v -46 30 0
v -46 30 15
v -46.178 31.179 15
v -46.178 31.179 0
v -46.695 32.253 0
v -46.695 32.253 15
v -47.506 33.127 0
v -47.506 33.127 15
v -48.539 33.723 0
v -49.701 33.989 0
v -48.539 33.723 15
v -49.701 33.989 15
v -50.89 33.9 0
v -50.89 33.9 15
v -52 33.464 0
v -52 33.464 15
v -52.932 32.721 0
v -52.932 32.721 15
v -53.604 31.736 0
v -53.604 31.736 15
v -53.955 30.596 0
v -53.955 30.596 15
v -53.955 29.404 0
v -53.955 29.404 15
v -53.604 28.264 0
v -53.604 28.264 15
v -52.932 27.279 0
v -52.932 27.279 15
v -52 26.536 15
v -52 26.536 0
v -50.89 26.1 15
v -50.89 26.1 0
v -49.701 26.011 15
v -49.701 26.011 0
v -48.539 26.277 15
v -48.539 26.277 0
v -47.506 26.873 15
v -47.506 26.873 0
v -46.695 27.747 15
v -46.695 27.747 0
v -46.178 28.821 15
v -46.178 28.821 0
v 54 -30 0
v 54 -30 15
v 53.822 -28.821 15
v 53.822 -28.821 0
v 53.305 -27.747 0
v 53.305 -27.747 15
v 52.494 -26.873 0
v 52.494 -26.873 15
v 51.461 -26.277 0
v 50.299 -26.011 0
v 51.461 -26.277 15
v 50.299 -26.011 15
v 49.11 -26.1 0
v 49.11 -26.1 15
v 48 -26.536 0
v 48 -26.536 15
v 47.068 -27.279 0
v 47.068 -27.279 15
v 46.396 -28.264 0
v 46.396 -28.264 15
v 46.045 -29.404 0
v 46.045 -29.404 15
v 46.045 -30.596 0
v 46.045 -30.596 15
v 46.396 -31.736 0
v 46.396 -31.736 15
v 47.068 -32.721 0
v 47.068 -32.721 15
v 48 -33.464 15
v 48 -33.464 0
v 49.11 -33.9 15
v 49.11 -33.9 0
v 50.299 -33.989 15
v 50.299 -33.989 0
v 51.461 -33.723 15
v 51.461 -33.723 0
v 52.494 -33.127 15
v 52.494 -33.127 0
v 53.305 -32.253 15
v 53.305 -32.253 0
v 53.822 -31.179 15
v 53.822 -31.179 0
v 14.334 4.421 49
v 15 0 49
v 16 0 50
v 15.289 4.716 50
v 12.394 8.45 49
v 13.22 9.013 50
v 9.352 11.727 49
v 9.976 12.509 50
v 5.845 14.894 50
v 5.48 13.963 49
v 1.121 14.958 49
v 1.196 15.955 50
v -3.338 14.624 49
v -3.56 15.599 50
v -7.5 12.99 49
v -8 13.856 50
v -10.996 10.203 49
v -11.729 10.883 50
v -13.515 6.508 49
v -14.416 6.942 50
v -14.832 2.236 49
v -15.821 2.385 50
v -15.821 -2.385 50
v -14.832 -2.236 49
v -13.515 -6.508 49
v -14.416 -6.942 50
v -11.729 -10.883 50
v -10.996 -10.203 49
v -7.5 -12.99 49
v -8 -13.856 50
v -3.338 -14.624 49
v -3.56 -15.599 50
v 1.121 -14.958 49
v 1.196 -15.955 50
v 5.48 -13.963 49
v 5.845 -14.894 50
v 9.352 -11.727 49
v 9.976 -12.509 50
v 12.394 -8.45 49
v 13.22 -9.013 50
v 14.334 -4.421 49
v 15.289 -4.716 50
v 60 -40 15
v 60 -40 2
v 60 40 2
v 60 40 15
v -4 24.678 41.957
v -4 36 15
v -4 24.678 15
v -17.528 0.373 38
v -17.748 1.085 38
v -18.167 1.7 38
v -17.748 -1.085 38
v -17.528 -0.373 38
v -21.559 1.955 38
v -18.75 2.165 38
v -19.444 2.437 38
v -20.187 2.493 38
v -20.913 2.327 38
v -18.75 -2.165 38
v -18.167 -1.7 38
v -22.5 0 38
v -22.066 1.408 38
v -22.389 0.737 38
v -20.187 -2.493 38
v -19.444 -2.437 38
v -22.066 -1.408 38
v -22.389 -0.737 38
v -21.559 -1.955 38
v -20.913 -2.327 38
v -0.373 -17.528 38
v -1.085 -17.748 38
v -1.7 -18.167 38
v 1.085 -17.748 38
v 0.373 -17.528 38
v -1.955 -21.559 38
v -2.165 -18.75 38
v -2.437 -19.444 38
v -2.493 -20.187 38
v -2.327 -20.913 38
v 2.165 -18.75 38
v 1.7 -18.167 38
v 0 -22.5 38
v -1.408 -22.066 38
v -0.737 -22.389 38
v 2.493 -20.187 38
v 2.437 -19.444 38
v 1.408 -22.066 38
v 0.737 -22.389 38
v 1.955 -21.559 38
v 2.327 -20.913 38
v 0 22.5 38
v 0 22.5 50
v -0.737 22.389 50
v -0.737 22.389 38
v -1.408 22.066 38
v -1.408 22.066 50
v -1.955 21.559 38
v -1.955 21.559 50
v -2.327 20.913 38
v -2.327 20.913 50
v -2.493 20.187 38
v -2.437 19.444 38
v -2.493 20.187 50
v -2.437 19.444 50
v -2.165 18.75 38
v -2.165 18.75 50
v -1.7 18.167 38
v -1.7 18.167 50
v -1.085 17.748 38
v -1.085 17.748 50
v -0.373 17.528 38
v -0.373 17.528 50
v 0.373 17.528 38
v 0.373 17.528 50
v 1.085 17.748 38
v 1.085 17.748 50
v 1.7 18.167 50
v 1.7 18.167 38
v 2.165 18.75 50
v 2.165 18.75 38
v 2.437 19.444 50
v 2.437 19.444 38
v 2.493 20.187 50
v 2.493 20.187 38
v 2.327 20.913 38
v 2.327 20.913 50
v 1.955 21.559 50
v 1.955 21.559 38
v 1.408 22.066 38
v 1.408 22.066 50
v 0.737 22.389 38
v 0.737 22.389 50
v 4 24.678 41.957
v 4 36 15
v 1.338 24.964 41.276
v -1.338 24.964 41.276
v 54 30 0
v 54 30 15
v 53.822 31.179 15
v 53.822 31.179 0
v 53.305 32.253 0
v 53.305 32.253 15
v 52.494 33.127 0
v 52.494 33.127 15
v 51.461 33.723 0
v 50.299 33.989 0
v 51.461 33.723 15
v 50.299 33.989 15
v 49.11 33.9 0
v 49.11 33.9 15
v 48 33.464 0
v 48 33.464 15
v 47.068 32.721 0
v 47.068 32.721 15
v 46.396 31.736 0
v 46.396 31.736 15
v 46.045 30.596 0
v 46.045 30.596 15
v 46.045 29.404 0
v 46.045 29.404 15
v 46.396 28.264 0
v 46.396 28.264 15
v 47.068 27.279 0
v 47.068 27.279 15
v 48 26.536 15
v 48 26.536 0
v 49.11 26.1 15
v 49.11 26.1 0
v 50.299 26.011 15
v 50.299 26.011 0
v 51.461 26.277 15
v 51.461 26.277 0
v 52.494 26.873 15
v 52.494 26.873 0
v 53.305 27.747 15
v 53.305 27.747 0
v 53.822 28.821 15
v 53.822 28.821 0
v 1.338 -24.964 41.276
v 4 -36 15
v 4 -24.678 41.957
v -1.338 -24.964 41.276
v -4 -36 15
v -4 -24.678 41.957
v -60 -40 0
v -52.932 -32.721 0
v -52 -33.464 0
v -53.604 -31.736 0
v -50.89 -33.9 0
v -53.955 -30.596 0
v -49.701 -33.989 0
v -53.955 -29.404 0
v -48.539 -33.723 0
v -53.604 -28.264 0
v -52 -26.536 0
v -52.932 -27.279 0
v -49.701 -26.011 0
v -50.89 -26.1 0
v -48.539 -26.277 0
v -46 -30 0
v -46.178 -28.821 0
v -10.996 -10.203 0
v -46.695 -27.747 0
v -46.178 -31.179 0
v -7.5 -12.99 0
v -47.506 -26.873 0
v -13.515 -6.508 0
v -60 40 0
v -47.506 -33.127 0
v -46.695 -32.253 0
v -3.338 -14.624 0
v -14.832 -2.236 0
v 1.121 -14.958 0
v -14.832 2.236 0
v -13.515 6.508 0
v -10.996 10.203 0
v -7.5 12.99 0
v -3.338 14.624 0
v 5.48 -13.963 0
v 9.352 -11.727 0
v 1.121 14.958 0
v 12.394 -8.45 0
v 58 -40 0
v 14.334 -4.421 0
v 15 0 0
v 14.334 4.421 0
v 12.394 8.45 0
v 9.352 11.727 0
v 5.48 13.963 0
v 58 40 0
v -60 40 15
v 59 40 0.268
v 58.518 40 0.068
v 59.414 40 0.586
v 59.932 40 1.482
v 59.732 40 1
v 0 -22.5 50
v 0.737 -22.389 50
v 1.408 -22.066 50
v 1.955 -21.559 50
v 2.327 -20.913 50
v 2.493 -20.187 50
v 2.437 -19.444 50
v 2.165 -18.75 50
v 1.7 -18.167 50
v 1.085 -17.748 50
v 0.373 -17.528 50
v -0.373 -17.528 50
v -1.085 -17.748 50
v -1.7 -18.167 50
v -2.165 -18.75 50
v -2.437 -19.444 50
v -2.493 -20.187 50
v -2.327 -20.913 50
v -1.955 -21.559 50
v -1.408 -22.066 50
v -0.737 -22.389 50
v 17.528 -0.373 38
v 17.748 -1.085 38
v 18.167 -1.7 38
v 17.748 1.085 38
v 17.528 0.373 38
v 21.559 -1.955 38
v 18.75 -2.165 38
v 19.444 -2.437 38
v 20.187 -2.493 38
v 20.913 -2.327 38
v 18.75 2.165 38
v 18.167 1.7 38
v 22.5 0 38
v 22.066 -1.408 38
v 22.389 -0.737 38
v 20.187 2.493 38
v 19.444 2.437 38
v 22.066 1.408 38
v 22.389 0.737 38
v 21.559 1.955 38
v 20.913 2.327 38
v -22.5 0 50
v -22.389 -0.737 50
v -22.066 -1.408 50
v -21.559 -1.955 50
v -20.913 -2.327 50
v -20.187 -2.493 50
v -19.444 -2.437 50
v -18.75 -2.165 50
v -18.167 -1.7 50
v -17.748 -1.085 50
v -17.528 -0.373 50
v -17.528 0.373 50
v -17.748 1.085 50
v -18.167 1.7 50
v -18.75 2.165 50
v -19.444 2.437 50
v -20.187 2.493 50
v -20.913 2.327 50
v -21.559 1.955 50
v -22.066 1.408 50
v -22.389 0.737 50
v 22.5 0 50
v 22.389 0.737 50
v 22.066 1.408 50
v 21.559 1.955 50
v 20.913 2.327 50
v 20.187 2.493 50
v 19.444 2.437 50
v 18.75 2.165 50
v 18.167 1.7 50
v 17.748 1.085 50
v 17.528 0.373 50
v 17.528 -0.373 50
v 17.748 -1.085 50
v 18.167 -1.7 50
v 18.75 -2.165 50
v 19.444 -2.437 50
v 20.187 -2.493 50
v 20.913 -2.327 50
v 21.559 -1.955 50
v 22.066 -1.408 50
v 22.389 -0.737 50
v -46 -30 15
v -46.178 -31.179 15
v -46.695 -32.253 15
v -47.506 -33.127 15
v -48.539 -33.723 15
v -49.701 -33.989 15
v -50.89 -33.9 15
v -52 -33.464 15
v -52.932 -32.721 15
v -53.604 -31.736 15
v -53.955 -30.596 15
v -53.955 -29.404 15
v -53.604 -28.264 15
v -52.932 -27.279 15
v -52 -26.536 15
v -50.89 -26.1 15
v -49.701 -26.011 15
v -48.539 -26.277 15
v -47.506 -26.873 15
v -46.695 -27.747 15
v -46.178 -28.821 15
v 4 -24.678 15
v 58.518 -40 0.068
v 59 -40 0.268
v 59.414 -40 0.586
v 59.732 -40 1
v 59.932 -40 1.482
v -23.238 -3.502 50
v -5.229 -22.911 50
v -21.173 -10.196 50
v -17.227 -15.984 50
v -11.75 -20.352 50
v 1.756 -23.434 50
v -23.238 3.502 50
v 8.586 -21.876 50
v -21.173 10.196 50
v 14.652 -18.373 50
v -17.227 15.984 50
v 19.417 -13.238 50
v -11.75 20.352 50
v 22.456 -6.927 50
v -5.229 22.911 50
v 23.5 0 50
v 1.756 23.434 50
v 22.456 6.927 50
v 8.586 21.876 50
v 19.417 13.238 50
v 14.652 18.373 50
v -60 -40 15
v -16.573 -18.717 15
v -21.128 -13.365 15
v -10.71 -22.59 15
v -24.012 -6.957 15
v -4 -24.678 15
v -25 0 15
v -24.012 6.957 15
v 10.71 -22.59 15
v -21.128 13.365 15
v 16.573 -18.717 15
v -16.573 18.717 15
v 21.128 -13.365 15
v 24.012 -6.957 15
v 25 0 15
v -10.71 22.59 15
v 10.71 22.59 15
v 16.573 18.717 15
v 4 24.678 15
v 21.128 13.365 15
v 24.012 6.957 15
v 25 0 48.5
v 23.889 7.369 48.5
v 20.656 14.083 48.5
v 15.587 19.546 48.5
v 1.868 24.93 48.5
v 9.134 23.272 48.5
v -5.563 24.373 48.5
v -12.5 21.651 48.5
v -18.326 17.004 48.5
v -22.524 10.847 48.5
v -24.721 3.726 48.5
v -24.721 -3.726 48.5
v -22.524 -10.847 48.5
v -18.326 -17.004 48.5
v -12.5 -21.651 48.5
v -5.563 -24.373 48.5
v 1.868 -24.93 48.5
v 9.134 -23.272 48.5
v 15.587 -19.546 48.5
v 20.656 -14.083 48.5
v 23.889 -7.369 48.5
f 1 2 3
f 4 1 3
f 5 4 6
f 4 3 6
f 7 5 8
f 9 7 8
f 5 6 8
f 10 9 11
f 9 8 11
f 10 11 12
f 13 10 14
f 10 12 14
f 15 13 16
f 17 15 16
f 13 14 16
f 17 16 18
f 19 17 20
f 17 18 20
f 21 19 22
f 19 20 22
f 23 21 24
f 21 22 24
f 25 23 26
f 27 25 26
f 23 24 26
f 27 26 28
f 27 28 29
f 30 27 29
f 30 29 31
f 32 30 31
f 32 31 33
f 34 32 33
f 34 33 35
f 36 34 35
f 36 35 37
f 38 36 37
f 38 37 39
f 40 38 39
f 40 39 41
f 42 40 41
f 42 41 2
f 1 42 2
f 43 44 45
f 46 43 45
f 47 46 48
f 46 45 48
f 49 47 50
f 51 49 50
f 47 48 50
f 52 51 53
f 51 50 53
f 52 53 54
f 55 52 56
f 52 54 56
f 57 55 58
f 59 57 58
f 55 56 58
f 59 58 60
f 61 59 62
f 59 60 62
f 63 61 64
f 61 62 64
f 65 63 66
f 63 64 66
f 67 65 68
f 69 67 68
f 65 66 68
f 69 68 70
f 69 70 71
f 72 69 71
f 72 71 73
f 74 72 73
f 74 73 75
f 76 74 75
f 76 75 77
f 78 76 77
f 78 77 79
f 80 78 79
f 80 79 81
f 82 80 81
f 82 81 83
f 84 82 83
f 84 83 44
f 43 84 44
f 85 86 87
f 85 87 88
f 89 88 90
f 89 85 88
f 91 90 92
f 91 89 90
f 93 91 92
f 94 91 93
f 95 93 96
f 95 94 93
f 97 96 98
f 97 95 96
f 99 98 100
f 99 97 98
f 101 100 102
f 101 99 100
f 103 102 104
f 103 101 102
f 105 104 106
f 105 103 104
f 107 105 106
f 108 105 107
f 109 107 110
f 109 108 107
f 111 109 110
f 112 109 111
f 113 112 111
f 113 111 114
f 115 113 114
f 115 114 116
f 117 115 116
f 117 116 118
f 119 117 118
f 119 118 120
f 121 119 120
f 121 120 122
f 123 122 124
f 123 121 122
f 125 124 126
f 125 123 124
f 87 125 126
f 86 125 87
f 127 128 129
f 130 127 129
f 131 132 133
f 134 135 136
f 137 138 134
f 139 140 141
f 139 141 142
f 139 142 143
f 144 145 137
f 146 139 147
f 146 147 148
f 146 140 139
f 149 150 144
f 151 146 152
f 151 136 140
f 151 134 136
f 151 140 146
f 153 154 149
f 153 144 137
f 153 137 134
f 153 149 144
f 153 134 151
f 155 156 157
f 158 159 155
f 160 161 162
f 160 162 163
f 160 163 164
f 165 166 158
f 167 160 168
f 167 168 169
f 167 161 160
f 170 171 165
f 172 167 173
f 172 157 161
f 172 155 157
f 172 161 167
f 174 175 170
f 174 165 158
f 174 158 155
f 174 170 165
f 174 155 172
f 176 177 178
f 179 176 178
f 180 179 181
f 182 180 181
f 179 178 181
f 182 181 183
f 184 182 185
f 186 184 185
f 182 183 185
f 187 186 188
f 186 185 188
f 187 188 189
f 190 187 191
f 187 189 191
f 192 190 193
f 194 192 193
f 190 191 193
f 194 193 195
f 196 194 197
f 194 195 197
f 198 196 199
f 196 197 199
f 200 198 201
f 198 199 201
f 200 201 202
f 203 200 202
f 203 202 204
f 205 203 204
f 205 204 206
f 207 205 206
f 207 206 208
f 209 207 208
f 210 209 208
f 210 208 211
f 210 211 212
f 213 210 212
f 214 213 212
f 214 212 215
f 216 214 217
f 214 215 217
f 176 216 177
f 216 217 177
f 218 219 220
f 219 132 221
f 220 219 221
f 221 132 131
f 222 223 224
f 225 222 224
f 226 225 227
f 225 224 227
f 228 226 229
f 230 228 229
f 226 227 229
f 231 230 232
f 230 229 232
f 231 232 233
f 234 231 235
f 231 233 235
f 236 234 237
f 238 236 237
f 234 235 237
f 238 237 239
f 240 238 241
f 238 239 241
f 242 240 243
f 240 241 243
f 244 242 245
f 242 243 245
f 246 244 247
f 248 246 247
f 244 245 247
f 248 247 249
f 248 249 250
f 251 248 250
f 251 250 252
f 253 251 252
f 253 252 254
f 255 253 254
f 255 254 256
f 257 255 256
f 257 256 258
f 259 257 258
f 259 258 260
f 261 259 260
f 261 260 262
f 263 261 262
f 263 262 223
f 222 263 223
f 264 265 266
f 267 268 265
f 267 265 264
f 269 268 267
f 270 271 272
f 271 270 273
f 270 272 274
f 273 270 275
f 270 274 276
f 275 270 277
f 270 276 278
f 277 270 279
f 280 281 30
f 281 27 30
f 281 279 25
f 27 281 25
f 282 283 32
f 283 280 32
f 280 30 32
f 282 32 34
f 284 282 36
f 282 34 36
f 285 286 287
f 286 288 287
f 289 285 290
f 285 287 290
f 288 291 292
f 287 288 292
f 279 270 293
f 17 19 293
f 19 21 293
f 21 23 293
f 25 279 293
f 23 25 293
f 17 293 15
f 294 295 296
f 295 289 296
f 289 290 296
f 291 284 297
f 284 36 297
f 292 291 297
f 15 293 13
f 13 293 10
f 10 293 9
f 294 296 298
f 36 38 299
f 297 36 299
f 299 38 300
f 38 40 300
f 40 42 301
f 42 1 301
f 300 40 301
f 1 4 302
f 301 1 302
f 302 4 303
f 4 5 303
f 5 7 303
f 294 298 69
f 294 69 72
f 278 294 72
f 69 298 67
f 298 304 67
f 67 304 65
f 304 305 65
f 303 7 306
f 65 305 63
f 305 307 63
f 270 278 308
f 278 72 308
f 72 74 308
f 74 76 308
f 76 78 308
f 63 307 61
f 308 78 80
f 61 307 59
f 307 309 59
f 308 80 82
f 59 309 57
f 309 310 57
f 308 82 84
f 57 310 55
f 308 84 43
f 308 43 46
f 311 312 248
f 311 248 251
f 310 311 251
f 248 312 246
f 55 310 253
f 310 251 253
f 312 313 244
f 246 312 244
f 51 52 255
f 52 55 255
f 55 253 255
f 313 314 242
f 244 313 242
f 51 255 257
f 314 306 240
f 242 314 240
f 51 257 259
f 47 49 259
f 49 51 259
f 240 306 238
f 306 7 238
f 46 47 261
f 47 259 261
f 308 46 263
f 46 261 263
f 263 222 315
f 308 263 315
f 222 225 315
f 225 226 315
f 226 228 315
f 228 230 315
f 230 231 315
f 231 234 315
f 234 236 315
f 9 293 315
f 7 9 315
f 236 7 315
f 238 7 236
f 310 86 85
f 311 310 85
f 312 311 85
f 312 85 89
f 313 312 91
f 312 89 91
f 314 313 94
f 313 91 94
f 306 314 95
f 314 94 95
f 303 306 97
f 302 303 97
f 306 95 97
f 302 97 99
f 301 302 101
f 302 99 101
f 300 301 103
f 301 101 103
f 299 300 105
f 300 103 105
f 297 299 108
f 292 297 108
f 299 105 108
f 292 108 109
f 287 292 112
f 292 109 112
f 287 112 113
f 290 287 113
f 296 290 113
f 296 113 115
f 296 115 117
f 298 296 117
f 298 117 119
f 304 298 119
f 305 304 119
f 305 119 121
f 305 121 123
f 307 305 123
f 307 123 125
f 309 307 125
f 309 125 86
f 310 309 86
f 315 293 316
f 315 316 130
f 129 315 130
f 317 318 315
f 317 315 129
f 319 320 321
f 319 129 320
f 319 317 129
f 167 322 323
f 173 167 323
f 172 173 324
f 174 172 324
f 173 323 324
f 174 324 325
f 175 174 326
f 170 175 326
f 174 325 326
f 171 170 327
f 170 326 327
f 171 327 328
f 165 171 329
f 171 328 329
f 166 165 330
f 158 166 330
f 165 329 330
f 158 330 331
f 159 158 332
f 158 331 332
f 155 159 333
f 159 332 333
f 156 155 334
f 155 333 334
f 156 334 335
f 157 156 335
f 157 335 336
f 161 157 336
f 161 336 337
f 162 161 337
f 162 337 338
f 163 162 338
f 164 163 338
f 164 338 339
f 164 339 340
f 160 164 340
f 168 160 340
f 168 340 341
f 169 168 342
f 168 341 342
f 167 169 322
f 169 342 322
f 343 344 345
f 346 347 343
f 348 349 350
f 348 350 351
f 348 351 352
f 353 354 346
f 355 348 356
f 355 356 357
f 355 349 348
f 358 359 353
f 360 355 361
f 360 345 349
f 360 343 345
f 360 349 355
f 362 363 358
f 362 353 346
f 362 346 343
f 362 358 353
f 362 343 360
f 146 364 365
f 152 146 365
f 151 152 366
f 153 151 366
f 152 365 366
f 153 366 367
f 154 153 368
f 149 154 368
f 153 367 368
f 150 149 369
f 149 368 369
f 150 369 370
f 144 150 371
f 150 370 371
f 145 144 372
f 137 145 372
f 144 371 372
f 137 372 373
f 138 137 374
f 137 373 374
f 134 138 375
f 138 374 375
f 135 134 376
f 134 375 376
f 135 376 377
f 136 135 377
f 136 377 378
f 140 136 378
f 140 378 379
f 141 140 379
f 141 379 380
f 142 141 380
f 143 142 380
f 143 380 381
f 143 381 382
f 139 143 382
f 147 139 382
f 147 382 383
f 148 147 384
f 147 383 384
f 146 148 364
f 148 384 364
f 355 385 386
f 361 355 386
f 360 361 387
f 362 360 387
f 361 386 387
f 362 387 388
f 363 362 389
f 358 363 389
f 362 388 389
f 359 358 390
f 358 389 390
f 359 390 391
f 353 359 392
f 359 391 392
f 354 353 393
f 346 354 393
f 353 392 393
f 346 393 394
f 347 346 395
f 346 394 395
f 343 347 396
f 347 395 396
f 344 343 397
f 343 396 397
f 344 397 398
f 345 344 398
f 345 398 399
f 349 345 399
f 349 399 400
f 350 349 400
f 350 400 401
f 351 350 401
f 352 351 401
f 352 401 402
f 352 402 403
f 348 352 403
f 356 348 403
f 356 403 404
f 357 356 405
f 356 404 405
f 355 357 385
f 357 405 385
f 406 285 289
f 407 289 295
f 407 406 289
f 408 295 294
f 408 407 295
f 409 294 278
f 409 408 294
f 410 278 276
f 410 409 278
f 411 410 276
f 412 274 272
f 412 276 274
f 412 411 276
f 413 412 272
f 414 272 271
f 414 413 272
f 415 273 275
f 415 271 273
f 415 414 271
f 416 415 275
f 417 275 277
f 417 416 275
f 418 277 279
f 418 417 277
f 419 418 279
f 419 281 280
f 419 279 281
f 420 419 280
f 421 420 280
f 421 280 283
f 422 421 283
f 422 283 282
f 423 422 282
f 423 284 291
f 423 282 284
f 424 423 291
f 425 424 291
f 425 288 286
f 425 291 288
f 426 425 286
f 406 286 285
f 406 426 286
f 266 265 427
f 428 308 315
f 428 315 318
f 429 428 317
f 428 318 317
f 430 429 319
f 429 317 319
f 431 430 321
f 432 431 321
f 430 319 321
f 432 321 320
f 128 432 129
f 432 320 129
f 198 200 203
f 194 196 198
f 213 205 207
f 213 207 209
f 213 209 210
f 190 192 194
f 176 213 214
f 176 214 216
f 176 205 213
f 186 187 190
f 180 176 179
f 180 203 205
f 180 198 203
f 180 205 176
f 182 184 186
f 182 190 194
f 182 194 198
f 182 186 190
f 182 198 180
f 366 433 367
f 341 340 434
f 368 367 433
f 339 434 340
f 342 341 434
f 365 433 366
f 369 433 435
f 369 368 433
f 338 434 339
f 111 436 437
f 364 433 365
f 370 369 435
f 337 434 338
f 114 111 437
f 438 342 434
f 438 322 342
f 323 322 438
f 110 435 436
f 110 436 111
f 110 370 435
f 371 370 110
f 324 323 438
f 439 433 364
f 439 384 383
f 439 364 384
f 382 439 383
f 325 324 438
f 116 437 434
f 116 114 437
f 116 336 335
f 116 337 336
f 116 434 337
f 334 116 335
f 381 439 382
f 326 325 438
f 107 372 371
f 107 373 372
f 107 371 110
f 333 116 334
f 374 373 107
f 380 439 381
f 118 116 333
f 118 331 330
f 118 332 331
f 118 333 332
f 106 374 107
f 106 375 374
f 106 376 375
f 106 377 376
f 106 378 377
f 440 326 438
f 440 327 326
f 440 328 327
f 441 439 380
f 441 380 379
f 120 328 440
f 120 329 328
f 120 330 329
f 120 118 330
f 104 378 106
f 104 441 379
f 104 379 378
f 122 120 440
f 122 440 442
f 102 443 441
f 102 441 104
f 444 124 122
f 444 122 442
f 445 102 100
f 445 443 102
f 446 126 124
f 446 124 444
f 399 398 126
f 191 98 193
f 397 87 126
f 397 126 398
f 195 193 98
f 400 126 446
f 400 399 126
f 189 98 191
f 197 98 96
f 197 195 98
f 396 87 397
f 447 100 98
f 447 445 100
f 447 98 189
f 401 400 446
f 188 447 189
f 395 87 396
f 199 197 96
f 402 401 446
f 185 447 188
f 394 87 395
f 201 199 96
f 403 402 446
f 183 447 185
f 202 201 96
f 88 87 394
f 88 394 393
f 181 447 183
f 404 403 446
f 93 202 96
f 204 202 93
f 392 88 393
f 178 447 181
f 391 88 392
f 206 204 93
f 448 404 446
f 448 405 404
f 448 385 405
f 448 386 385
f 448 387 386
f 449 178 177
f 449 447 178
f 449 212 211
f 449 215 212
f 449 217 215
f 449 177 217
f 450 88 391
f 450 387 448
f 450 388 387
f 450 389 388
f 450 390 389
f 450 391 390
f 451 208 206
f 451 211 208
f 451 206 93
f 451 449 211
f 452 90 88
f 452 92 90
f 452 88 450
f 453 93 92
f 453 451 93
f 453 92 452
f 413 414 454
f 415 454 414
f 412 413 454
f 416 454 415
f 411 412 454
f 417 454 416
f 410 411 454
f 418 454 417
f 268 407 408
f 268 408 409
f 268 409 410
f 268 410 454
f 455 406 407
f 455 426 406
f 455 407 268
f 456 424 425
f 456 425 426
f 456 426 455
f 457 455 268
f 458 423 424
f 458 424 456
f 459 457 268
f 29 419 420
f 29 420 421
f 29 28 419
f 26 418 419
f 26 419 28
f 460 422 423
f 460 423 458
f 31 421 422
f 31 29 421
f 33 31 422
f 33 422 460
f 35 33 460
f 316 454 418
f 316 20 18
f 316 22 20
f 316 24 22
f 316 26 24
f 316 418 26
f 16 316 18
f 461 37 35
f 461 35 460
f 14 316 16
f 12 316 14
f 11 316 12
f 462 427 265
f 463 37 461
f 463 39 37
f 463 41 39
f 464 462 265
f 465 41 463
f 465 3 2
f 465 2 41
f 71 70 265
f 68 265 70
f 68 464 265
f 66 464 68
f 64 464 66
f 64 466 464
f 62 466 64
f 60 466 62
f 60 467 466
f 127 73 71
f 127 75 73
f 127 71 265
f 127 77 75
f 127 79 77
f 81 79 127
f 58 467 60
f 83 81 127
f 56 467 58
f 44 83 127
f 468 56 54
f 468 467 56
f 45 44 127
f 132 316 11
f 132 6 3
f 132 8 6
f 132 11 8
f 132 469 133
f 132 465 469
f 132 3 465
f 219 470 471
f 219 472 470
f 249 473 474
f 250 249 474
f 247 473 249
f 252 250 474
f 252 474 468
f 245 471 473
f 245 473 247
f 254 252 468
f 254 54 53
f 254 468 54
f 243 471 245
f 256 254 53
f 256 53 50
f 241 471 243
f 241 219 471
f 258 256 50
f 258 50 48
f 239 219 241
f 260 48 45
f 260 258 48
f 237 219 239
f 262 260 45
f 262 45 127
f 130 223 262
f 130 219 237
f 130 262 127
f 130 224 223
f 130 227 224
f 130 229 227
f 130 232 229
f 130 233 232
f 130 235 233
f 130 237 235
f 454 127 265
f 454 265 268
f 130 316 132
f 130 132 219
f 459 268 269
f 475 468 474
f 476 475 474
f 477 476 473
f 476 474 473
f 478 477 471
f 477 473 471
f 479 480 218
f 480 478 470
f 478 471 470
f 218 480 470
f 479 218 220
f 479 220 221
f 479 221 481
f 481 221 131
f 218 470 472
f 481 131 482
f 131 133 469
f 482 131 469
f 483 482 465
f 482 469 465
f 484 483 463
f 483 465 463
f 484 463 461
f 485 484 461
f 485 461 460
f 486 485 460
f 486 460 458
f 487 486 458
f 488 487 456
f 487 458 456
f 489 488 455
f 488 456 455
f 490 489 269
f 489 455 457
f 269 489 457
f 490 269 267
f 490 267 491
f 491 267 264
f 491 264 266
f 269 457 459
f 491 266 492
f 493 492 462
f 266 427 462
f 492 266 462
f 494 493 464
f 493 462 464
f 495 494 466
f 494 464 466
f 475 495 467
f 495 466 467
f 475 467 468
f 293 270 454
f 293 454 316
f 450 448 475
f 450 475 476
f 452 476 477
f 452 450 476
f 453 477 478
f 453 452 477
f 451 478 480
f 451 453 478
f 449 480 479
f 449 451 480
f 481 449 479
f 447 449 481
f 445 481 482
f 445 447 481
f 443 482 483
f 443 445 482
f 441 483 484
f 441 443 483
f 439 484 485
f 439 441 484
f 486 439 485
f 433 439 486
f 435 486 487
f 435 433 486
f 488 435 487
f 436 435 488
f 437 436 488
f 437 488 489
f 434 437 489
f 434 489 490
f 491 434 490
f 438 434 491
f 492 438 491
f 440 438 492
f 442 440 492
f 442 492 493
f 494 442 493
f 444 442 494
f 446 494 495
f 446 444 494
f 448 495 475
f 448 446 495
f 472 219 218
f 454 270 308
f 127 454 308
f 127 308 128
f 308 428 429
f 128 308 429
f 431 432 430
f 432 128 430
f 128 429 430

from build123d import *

# Parameters (mm, degrees)
SKETCH1_W               = 120
SKETCH1_H               = 80
BOSS_EXTRUDE1_DEPTH     = 15
SKETCH2_R               = 25
BOSS_EXTRUDE2_DEPTH     = 35
SKETCH3_R               = 15
CUT_EXTRUDE1_DEPTH      = 88.749643874
SKETCH4_R               = 4
CUT_EXTRUDE2_DEPTH      = 81.156097709
LPATTERN1_COUNT         = 2
LPATTERN1_PITCH         = 100
MIRROR1_COPY_1_SKETCH_R = 4
MIRROR1_COPY_1_DEPTH    = 81.156097709
SKETCH5_R               = 2.5
CUT_EXTRUDE3_DEPTH      = 12
CIRPATTERN1_COUNT       = 4
CHAMFER1_SIZE           = 1.5
CHAMFER2_SIZE           = 1
RIB6_REACH              = 89.75
SKETCH8_2_WALL_W        = 204.614781474
SKETCH8_2_WALL_H        = 8
RIB7_REACH              = 89.75
SKETCH9_WALL_W          = 204.614781474
SKETCH9_WALL_H          = 8
FILLET2_R               = 2


with BuildPart() as part:
    # Sketch1 → Boss-Extrude1 (new body)
    with BuildSketch(Plane.XY):
        Rectangle(SKETCH1_W, SKETCH1_H)
    extrude(amount=BOSS_EXTRUDE1_DEPTH)

    # Sketch2 → Boss-Extrude2 (add)
    with BuildSketch(Plane.XY.offset(15)):
        Circle(SKETCH2_R)
    extrude(amount=BOSS_EXTRUDE2_DEPTH)

    # Sketch3 → Cut-Extrude1 (cut, through all)
    with BuildSketch(Plane.XY.offset(50)):
        Circle(SKETCH3_R)
    extrude(amount=-CUT_EXTRUDE1_DEPTH, mode=Mode.SUBTRACT)

    # Sketch4 → Cut-Extrude2 (cut, through all)
    with BuildSketch(Plane.XY.offset(15)):
        with Locations((-50, 30)):
            Circle(SKETCH4_R)
    cut_extrude2 = extrude(amount=-CUT_EXTRUDE2_DEPTH, mode=Mode.SUBTRACT)

    # LPattern1: Cut-Extrude2 ×2
    with Locations(*[(i * LPATTERN1_PITCH, 0, 0) for i in range(1, LPATTERN1_COUNT)]):
        add(cut_extrude2, mode=Mode.SUBTRACT)

    # Mirror1: Cut-Extrude2 across plane
    add(cut_extrude2.mirror(Plane.ZX), mode=Mode.SUBTRACT)

    # Mirror1 copy 1 sketch → Mirror1 copy 1 (cut, through all)
    with BuildSketch(Plane(origin=(100, 0, 15), x_dir=(1, 0, 0), z_dir=(0, 0, 1))):
        with Locations((-50, -30)):
            Circle(MIRROR1_COPY_1_SKETCH_R)
    extrude(amount=-MIRROR1_COPY_1_DEPTH, mode=Mode.SUBTRACT)

    # Sketch5 → Cut-Extrude3 (cut)
    with BuildSketch(Plane.XY.offset(50)):
        with Locations((20, 0)):
            Circle(SKETCH5_R)
    cut_extrude3 = extrude(amount=-CUT_EXTRUDE3_DEPTH, mode=Mode.SUBTRACT)

    # CirPattern1: Cut-Extrude3 ×4 about axis
    cirpattern1_axis = Axis((0, 0, 52.5), (0, 0, -1))
    for i in range(1, CIRPATTERN1_COUNT):
        add(cut_extrude3.rotate(cirpattern1_axis, i * 360 / CIRPATTERN1_COUNT), mode=Mode.SUBTRACT)

    # Chamfer1
    chamfer1_edges = [part.edges().sort_by_distance(p)[0] for p in [
        (-25, 0, 50),
    ]]
    chamfer(chamfer1_edges, length=CHAMFER1_SIZE)

    # Chamfer2
    chamfer2_edges = [part.edges().sort_by_distance(p)[0] for p in [
        (-15, 0, 50),
    ]]
    chamfer(chamfer2_edges, length=CHAMFER2_SIZE)

    # Sketch8<2> wall → Rib6 (add, up to next)
    with BuildSketch(Plane(origin=(0, 30.75, 27.5), x_dir=(0, -0.387232484355, 0.921982105607), z_dir=(0, -0.921982105607, -0.387232484355)), mode=Mode.PRIVATE) as rib6_sk1:
        Rectangle(SKETCH8_2_WALL_W, SKETCH8_2_WALL_H)
    rib6_tool1 = extrude(rib6_sk1.sketch, amount=RIB6_REACH, mode=Mode.PRIVATE) - part.part
    add(rib6_tool1.solids().sort_by_distance((0, 30.75, 27.5))[0])

    # Sketch9 wall → Rib7 (add, up to next)
    with BuildSketch(Plane(origin=(0, -30.75, 27.5), x_dir=(0, 0.387232484355, 0.921982105607), z_dir=(0, -0.921982105607, 0.387232484355)), mode=Mode.PRIVATE) as rib7_sk1:
        Rectangle(SKETCH9_WALL_W, SKETCH9_WALL_H)
    rib7_tool1 = extrude(rib7_sk1.sketch, amount=-RIB7_REACH, mode=Mode.PRIVATE) - part.part
    add(rib7_tool1.solids().sort_by_distance((0, -30.75, 27.5))[0])

    # Fillet2
    fillet2_edges = [part.edges().sort_by_distance(p)[0] for p in [
        (60, 0, 0),
    ]]
    fillet(fillet2_edges, radius=FILLET2_R)


solid = part.part
